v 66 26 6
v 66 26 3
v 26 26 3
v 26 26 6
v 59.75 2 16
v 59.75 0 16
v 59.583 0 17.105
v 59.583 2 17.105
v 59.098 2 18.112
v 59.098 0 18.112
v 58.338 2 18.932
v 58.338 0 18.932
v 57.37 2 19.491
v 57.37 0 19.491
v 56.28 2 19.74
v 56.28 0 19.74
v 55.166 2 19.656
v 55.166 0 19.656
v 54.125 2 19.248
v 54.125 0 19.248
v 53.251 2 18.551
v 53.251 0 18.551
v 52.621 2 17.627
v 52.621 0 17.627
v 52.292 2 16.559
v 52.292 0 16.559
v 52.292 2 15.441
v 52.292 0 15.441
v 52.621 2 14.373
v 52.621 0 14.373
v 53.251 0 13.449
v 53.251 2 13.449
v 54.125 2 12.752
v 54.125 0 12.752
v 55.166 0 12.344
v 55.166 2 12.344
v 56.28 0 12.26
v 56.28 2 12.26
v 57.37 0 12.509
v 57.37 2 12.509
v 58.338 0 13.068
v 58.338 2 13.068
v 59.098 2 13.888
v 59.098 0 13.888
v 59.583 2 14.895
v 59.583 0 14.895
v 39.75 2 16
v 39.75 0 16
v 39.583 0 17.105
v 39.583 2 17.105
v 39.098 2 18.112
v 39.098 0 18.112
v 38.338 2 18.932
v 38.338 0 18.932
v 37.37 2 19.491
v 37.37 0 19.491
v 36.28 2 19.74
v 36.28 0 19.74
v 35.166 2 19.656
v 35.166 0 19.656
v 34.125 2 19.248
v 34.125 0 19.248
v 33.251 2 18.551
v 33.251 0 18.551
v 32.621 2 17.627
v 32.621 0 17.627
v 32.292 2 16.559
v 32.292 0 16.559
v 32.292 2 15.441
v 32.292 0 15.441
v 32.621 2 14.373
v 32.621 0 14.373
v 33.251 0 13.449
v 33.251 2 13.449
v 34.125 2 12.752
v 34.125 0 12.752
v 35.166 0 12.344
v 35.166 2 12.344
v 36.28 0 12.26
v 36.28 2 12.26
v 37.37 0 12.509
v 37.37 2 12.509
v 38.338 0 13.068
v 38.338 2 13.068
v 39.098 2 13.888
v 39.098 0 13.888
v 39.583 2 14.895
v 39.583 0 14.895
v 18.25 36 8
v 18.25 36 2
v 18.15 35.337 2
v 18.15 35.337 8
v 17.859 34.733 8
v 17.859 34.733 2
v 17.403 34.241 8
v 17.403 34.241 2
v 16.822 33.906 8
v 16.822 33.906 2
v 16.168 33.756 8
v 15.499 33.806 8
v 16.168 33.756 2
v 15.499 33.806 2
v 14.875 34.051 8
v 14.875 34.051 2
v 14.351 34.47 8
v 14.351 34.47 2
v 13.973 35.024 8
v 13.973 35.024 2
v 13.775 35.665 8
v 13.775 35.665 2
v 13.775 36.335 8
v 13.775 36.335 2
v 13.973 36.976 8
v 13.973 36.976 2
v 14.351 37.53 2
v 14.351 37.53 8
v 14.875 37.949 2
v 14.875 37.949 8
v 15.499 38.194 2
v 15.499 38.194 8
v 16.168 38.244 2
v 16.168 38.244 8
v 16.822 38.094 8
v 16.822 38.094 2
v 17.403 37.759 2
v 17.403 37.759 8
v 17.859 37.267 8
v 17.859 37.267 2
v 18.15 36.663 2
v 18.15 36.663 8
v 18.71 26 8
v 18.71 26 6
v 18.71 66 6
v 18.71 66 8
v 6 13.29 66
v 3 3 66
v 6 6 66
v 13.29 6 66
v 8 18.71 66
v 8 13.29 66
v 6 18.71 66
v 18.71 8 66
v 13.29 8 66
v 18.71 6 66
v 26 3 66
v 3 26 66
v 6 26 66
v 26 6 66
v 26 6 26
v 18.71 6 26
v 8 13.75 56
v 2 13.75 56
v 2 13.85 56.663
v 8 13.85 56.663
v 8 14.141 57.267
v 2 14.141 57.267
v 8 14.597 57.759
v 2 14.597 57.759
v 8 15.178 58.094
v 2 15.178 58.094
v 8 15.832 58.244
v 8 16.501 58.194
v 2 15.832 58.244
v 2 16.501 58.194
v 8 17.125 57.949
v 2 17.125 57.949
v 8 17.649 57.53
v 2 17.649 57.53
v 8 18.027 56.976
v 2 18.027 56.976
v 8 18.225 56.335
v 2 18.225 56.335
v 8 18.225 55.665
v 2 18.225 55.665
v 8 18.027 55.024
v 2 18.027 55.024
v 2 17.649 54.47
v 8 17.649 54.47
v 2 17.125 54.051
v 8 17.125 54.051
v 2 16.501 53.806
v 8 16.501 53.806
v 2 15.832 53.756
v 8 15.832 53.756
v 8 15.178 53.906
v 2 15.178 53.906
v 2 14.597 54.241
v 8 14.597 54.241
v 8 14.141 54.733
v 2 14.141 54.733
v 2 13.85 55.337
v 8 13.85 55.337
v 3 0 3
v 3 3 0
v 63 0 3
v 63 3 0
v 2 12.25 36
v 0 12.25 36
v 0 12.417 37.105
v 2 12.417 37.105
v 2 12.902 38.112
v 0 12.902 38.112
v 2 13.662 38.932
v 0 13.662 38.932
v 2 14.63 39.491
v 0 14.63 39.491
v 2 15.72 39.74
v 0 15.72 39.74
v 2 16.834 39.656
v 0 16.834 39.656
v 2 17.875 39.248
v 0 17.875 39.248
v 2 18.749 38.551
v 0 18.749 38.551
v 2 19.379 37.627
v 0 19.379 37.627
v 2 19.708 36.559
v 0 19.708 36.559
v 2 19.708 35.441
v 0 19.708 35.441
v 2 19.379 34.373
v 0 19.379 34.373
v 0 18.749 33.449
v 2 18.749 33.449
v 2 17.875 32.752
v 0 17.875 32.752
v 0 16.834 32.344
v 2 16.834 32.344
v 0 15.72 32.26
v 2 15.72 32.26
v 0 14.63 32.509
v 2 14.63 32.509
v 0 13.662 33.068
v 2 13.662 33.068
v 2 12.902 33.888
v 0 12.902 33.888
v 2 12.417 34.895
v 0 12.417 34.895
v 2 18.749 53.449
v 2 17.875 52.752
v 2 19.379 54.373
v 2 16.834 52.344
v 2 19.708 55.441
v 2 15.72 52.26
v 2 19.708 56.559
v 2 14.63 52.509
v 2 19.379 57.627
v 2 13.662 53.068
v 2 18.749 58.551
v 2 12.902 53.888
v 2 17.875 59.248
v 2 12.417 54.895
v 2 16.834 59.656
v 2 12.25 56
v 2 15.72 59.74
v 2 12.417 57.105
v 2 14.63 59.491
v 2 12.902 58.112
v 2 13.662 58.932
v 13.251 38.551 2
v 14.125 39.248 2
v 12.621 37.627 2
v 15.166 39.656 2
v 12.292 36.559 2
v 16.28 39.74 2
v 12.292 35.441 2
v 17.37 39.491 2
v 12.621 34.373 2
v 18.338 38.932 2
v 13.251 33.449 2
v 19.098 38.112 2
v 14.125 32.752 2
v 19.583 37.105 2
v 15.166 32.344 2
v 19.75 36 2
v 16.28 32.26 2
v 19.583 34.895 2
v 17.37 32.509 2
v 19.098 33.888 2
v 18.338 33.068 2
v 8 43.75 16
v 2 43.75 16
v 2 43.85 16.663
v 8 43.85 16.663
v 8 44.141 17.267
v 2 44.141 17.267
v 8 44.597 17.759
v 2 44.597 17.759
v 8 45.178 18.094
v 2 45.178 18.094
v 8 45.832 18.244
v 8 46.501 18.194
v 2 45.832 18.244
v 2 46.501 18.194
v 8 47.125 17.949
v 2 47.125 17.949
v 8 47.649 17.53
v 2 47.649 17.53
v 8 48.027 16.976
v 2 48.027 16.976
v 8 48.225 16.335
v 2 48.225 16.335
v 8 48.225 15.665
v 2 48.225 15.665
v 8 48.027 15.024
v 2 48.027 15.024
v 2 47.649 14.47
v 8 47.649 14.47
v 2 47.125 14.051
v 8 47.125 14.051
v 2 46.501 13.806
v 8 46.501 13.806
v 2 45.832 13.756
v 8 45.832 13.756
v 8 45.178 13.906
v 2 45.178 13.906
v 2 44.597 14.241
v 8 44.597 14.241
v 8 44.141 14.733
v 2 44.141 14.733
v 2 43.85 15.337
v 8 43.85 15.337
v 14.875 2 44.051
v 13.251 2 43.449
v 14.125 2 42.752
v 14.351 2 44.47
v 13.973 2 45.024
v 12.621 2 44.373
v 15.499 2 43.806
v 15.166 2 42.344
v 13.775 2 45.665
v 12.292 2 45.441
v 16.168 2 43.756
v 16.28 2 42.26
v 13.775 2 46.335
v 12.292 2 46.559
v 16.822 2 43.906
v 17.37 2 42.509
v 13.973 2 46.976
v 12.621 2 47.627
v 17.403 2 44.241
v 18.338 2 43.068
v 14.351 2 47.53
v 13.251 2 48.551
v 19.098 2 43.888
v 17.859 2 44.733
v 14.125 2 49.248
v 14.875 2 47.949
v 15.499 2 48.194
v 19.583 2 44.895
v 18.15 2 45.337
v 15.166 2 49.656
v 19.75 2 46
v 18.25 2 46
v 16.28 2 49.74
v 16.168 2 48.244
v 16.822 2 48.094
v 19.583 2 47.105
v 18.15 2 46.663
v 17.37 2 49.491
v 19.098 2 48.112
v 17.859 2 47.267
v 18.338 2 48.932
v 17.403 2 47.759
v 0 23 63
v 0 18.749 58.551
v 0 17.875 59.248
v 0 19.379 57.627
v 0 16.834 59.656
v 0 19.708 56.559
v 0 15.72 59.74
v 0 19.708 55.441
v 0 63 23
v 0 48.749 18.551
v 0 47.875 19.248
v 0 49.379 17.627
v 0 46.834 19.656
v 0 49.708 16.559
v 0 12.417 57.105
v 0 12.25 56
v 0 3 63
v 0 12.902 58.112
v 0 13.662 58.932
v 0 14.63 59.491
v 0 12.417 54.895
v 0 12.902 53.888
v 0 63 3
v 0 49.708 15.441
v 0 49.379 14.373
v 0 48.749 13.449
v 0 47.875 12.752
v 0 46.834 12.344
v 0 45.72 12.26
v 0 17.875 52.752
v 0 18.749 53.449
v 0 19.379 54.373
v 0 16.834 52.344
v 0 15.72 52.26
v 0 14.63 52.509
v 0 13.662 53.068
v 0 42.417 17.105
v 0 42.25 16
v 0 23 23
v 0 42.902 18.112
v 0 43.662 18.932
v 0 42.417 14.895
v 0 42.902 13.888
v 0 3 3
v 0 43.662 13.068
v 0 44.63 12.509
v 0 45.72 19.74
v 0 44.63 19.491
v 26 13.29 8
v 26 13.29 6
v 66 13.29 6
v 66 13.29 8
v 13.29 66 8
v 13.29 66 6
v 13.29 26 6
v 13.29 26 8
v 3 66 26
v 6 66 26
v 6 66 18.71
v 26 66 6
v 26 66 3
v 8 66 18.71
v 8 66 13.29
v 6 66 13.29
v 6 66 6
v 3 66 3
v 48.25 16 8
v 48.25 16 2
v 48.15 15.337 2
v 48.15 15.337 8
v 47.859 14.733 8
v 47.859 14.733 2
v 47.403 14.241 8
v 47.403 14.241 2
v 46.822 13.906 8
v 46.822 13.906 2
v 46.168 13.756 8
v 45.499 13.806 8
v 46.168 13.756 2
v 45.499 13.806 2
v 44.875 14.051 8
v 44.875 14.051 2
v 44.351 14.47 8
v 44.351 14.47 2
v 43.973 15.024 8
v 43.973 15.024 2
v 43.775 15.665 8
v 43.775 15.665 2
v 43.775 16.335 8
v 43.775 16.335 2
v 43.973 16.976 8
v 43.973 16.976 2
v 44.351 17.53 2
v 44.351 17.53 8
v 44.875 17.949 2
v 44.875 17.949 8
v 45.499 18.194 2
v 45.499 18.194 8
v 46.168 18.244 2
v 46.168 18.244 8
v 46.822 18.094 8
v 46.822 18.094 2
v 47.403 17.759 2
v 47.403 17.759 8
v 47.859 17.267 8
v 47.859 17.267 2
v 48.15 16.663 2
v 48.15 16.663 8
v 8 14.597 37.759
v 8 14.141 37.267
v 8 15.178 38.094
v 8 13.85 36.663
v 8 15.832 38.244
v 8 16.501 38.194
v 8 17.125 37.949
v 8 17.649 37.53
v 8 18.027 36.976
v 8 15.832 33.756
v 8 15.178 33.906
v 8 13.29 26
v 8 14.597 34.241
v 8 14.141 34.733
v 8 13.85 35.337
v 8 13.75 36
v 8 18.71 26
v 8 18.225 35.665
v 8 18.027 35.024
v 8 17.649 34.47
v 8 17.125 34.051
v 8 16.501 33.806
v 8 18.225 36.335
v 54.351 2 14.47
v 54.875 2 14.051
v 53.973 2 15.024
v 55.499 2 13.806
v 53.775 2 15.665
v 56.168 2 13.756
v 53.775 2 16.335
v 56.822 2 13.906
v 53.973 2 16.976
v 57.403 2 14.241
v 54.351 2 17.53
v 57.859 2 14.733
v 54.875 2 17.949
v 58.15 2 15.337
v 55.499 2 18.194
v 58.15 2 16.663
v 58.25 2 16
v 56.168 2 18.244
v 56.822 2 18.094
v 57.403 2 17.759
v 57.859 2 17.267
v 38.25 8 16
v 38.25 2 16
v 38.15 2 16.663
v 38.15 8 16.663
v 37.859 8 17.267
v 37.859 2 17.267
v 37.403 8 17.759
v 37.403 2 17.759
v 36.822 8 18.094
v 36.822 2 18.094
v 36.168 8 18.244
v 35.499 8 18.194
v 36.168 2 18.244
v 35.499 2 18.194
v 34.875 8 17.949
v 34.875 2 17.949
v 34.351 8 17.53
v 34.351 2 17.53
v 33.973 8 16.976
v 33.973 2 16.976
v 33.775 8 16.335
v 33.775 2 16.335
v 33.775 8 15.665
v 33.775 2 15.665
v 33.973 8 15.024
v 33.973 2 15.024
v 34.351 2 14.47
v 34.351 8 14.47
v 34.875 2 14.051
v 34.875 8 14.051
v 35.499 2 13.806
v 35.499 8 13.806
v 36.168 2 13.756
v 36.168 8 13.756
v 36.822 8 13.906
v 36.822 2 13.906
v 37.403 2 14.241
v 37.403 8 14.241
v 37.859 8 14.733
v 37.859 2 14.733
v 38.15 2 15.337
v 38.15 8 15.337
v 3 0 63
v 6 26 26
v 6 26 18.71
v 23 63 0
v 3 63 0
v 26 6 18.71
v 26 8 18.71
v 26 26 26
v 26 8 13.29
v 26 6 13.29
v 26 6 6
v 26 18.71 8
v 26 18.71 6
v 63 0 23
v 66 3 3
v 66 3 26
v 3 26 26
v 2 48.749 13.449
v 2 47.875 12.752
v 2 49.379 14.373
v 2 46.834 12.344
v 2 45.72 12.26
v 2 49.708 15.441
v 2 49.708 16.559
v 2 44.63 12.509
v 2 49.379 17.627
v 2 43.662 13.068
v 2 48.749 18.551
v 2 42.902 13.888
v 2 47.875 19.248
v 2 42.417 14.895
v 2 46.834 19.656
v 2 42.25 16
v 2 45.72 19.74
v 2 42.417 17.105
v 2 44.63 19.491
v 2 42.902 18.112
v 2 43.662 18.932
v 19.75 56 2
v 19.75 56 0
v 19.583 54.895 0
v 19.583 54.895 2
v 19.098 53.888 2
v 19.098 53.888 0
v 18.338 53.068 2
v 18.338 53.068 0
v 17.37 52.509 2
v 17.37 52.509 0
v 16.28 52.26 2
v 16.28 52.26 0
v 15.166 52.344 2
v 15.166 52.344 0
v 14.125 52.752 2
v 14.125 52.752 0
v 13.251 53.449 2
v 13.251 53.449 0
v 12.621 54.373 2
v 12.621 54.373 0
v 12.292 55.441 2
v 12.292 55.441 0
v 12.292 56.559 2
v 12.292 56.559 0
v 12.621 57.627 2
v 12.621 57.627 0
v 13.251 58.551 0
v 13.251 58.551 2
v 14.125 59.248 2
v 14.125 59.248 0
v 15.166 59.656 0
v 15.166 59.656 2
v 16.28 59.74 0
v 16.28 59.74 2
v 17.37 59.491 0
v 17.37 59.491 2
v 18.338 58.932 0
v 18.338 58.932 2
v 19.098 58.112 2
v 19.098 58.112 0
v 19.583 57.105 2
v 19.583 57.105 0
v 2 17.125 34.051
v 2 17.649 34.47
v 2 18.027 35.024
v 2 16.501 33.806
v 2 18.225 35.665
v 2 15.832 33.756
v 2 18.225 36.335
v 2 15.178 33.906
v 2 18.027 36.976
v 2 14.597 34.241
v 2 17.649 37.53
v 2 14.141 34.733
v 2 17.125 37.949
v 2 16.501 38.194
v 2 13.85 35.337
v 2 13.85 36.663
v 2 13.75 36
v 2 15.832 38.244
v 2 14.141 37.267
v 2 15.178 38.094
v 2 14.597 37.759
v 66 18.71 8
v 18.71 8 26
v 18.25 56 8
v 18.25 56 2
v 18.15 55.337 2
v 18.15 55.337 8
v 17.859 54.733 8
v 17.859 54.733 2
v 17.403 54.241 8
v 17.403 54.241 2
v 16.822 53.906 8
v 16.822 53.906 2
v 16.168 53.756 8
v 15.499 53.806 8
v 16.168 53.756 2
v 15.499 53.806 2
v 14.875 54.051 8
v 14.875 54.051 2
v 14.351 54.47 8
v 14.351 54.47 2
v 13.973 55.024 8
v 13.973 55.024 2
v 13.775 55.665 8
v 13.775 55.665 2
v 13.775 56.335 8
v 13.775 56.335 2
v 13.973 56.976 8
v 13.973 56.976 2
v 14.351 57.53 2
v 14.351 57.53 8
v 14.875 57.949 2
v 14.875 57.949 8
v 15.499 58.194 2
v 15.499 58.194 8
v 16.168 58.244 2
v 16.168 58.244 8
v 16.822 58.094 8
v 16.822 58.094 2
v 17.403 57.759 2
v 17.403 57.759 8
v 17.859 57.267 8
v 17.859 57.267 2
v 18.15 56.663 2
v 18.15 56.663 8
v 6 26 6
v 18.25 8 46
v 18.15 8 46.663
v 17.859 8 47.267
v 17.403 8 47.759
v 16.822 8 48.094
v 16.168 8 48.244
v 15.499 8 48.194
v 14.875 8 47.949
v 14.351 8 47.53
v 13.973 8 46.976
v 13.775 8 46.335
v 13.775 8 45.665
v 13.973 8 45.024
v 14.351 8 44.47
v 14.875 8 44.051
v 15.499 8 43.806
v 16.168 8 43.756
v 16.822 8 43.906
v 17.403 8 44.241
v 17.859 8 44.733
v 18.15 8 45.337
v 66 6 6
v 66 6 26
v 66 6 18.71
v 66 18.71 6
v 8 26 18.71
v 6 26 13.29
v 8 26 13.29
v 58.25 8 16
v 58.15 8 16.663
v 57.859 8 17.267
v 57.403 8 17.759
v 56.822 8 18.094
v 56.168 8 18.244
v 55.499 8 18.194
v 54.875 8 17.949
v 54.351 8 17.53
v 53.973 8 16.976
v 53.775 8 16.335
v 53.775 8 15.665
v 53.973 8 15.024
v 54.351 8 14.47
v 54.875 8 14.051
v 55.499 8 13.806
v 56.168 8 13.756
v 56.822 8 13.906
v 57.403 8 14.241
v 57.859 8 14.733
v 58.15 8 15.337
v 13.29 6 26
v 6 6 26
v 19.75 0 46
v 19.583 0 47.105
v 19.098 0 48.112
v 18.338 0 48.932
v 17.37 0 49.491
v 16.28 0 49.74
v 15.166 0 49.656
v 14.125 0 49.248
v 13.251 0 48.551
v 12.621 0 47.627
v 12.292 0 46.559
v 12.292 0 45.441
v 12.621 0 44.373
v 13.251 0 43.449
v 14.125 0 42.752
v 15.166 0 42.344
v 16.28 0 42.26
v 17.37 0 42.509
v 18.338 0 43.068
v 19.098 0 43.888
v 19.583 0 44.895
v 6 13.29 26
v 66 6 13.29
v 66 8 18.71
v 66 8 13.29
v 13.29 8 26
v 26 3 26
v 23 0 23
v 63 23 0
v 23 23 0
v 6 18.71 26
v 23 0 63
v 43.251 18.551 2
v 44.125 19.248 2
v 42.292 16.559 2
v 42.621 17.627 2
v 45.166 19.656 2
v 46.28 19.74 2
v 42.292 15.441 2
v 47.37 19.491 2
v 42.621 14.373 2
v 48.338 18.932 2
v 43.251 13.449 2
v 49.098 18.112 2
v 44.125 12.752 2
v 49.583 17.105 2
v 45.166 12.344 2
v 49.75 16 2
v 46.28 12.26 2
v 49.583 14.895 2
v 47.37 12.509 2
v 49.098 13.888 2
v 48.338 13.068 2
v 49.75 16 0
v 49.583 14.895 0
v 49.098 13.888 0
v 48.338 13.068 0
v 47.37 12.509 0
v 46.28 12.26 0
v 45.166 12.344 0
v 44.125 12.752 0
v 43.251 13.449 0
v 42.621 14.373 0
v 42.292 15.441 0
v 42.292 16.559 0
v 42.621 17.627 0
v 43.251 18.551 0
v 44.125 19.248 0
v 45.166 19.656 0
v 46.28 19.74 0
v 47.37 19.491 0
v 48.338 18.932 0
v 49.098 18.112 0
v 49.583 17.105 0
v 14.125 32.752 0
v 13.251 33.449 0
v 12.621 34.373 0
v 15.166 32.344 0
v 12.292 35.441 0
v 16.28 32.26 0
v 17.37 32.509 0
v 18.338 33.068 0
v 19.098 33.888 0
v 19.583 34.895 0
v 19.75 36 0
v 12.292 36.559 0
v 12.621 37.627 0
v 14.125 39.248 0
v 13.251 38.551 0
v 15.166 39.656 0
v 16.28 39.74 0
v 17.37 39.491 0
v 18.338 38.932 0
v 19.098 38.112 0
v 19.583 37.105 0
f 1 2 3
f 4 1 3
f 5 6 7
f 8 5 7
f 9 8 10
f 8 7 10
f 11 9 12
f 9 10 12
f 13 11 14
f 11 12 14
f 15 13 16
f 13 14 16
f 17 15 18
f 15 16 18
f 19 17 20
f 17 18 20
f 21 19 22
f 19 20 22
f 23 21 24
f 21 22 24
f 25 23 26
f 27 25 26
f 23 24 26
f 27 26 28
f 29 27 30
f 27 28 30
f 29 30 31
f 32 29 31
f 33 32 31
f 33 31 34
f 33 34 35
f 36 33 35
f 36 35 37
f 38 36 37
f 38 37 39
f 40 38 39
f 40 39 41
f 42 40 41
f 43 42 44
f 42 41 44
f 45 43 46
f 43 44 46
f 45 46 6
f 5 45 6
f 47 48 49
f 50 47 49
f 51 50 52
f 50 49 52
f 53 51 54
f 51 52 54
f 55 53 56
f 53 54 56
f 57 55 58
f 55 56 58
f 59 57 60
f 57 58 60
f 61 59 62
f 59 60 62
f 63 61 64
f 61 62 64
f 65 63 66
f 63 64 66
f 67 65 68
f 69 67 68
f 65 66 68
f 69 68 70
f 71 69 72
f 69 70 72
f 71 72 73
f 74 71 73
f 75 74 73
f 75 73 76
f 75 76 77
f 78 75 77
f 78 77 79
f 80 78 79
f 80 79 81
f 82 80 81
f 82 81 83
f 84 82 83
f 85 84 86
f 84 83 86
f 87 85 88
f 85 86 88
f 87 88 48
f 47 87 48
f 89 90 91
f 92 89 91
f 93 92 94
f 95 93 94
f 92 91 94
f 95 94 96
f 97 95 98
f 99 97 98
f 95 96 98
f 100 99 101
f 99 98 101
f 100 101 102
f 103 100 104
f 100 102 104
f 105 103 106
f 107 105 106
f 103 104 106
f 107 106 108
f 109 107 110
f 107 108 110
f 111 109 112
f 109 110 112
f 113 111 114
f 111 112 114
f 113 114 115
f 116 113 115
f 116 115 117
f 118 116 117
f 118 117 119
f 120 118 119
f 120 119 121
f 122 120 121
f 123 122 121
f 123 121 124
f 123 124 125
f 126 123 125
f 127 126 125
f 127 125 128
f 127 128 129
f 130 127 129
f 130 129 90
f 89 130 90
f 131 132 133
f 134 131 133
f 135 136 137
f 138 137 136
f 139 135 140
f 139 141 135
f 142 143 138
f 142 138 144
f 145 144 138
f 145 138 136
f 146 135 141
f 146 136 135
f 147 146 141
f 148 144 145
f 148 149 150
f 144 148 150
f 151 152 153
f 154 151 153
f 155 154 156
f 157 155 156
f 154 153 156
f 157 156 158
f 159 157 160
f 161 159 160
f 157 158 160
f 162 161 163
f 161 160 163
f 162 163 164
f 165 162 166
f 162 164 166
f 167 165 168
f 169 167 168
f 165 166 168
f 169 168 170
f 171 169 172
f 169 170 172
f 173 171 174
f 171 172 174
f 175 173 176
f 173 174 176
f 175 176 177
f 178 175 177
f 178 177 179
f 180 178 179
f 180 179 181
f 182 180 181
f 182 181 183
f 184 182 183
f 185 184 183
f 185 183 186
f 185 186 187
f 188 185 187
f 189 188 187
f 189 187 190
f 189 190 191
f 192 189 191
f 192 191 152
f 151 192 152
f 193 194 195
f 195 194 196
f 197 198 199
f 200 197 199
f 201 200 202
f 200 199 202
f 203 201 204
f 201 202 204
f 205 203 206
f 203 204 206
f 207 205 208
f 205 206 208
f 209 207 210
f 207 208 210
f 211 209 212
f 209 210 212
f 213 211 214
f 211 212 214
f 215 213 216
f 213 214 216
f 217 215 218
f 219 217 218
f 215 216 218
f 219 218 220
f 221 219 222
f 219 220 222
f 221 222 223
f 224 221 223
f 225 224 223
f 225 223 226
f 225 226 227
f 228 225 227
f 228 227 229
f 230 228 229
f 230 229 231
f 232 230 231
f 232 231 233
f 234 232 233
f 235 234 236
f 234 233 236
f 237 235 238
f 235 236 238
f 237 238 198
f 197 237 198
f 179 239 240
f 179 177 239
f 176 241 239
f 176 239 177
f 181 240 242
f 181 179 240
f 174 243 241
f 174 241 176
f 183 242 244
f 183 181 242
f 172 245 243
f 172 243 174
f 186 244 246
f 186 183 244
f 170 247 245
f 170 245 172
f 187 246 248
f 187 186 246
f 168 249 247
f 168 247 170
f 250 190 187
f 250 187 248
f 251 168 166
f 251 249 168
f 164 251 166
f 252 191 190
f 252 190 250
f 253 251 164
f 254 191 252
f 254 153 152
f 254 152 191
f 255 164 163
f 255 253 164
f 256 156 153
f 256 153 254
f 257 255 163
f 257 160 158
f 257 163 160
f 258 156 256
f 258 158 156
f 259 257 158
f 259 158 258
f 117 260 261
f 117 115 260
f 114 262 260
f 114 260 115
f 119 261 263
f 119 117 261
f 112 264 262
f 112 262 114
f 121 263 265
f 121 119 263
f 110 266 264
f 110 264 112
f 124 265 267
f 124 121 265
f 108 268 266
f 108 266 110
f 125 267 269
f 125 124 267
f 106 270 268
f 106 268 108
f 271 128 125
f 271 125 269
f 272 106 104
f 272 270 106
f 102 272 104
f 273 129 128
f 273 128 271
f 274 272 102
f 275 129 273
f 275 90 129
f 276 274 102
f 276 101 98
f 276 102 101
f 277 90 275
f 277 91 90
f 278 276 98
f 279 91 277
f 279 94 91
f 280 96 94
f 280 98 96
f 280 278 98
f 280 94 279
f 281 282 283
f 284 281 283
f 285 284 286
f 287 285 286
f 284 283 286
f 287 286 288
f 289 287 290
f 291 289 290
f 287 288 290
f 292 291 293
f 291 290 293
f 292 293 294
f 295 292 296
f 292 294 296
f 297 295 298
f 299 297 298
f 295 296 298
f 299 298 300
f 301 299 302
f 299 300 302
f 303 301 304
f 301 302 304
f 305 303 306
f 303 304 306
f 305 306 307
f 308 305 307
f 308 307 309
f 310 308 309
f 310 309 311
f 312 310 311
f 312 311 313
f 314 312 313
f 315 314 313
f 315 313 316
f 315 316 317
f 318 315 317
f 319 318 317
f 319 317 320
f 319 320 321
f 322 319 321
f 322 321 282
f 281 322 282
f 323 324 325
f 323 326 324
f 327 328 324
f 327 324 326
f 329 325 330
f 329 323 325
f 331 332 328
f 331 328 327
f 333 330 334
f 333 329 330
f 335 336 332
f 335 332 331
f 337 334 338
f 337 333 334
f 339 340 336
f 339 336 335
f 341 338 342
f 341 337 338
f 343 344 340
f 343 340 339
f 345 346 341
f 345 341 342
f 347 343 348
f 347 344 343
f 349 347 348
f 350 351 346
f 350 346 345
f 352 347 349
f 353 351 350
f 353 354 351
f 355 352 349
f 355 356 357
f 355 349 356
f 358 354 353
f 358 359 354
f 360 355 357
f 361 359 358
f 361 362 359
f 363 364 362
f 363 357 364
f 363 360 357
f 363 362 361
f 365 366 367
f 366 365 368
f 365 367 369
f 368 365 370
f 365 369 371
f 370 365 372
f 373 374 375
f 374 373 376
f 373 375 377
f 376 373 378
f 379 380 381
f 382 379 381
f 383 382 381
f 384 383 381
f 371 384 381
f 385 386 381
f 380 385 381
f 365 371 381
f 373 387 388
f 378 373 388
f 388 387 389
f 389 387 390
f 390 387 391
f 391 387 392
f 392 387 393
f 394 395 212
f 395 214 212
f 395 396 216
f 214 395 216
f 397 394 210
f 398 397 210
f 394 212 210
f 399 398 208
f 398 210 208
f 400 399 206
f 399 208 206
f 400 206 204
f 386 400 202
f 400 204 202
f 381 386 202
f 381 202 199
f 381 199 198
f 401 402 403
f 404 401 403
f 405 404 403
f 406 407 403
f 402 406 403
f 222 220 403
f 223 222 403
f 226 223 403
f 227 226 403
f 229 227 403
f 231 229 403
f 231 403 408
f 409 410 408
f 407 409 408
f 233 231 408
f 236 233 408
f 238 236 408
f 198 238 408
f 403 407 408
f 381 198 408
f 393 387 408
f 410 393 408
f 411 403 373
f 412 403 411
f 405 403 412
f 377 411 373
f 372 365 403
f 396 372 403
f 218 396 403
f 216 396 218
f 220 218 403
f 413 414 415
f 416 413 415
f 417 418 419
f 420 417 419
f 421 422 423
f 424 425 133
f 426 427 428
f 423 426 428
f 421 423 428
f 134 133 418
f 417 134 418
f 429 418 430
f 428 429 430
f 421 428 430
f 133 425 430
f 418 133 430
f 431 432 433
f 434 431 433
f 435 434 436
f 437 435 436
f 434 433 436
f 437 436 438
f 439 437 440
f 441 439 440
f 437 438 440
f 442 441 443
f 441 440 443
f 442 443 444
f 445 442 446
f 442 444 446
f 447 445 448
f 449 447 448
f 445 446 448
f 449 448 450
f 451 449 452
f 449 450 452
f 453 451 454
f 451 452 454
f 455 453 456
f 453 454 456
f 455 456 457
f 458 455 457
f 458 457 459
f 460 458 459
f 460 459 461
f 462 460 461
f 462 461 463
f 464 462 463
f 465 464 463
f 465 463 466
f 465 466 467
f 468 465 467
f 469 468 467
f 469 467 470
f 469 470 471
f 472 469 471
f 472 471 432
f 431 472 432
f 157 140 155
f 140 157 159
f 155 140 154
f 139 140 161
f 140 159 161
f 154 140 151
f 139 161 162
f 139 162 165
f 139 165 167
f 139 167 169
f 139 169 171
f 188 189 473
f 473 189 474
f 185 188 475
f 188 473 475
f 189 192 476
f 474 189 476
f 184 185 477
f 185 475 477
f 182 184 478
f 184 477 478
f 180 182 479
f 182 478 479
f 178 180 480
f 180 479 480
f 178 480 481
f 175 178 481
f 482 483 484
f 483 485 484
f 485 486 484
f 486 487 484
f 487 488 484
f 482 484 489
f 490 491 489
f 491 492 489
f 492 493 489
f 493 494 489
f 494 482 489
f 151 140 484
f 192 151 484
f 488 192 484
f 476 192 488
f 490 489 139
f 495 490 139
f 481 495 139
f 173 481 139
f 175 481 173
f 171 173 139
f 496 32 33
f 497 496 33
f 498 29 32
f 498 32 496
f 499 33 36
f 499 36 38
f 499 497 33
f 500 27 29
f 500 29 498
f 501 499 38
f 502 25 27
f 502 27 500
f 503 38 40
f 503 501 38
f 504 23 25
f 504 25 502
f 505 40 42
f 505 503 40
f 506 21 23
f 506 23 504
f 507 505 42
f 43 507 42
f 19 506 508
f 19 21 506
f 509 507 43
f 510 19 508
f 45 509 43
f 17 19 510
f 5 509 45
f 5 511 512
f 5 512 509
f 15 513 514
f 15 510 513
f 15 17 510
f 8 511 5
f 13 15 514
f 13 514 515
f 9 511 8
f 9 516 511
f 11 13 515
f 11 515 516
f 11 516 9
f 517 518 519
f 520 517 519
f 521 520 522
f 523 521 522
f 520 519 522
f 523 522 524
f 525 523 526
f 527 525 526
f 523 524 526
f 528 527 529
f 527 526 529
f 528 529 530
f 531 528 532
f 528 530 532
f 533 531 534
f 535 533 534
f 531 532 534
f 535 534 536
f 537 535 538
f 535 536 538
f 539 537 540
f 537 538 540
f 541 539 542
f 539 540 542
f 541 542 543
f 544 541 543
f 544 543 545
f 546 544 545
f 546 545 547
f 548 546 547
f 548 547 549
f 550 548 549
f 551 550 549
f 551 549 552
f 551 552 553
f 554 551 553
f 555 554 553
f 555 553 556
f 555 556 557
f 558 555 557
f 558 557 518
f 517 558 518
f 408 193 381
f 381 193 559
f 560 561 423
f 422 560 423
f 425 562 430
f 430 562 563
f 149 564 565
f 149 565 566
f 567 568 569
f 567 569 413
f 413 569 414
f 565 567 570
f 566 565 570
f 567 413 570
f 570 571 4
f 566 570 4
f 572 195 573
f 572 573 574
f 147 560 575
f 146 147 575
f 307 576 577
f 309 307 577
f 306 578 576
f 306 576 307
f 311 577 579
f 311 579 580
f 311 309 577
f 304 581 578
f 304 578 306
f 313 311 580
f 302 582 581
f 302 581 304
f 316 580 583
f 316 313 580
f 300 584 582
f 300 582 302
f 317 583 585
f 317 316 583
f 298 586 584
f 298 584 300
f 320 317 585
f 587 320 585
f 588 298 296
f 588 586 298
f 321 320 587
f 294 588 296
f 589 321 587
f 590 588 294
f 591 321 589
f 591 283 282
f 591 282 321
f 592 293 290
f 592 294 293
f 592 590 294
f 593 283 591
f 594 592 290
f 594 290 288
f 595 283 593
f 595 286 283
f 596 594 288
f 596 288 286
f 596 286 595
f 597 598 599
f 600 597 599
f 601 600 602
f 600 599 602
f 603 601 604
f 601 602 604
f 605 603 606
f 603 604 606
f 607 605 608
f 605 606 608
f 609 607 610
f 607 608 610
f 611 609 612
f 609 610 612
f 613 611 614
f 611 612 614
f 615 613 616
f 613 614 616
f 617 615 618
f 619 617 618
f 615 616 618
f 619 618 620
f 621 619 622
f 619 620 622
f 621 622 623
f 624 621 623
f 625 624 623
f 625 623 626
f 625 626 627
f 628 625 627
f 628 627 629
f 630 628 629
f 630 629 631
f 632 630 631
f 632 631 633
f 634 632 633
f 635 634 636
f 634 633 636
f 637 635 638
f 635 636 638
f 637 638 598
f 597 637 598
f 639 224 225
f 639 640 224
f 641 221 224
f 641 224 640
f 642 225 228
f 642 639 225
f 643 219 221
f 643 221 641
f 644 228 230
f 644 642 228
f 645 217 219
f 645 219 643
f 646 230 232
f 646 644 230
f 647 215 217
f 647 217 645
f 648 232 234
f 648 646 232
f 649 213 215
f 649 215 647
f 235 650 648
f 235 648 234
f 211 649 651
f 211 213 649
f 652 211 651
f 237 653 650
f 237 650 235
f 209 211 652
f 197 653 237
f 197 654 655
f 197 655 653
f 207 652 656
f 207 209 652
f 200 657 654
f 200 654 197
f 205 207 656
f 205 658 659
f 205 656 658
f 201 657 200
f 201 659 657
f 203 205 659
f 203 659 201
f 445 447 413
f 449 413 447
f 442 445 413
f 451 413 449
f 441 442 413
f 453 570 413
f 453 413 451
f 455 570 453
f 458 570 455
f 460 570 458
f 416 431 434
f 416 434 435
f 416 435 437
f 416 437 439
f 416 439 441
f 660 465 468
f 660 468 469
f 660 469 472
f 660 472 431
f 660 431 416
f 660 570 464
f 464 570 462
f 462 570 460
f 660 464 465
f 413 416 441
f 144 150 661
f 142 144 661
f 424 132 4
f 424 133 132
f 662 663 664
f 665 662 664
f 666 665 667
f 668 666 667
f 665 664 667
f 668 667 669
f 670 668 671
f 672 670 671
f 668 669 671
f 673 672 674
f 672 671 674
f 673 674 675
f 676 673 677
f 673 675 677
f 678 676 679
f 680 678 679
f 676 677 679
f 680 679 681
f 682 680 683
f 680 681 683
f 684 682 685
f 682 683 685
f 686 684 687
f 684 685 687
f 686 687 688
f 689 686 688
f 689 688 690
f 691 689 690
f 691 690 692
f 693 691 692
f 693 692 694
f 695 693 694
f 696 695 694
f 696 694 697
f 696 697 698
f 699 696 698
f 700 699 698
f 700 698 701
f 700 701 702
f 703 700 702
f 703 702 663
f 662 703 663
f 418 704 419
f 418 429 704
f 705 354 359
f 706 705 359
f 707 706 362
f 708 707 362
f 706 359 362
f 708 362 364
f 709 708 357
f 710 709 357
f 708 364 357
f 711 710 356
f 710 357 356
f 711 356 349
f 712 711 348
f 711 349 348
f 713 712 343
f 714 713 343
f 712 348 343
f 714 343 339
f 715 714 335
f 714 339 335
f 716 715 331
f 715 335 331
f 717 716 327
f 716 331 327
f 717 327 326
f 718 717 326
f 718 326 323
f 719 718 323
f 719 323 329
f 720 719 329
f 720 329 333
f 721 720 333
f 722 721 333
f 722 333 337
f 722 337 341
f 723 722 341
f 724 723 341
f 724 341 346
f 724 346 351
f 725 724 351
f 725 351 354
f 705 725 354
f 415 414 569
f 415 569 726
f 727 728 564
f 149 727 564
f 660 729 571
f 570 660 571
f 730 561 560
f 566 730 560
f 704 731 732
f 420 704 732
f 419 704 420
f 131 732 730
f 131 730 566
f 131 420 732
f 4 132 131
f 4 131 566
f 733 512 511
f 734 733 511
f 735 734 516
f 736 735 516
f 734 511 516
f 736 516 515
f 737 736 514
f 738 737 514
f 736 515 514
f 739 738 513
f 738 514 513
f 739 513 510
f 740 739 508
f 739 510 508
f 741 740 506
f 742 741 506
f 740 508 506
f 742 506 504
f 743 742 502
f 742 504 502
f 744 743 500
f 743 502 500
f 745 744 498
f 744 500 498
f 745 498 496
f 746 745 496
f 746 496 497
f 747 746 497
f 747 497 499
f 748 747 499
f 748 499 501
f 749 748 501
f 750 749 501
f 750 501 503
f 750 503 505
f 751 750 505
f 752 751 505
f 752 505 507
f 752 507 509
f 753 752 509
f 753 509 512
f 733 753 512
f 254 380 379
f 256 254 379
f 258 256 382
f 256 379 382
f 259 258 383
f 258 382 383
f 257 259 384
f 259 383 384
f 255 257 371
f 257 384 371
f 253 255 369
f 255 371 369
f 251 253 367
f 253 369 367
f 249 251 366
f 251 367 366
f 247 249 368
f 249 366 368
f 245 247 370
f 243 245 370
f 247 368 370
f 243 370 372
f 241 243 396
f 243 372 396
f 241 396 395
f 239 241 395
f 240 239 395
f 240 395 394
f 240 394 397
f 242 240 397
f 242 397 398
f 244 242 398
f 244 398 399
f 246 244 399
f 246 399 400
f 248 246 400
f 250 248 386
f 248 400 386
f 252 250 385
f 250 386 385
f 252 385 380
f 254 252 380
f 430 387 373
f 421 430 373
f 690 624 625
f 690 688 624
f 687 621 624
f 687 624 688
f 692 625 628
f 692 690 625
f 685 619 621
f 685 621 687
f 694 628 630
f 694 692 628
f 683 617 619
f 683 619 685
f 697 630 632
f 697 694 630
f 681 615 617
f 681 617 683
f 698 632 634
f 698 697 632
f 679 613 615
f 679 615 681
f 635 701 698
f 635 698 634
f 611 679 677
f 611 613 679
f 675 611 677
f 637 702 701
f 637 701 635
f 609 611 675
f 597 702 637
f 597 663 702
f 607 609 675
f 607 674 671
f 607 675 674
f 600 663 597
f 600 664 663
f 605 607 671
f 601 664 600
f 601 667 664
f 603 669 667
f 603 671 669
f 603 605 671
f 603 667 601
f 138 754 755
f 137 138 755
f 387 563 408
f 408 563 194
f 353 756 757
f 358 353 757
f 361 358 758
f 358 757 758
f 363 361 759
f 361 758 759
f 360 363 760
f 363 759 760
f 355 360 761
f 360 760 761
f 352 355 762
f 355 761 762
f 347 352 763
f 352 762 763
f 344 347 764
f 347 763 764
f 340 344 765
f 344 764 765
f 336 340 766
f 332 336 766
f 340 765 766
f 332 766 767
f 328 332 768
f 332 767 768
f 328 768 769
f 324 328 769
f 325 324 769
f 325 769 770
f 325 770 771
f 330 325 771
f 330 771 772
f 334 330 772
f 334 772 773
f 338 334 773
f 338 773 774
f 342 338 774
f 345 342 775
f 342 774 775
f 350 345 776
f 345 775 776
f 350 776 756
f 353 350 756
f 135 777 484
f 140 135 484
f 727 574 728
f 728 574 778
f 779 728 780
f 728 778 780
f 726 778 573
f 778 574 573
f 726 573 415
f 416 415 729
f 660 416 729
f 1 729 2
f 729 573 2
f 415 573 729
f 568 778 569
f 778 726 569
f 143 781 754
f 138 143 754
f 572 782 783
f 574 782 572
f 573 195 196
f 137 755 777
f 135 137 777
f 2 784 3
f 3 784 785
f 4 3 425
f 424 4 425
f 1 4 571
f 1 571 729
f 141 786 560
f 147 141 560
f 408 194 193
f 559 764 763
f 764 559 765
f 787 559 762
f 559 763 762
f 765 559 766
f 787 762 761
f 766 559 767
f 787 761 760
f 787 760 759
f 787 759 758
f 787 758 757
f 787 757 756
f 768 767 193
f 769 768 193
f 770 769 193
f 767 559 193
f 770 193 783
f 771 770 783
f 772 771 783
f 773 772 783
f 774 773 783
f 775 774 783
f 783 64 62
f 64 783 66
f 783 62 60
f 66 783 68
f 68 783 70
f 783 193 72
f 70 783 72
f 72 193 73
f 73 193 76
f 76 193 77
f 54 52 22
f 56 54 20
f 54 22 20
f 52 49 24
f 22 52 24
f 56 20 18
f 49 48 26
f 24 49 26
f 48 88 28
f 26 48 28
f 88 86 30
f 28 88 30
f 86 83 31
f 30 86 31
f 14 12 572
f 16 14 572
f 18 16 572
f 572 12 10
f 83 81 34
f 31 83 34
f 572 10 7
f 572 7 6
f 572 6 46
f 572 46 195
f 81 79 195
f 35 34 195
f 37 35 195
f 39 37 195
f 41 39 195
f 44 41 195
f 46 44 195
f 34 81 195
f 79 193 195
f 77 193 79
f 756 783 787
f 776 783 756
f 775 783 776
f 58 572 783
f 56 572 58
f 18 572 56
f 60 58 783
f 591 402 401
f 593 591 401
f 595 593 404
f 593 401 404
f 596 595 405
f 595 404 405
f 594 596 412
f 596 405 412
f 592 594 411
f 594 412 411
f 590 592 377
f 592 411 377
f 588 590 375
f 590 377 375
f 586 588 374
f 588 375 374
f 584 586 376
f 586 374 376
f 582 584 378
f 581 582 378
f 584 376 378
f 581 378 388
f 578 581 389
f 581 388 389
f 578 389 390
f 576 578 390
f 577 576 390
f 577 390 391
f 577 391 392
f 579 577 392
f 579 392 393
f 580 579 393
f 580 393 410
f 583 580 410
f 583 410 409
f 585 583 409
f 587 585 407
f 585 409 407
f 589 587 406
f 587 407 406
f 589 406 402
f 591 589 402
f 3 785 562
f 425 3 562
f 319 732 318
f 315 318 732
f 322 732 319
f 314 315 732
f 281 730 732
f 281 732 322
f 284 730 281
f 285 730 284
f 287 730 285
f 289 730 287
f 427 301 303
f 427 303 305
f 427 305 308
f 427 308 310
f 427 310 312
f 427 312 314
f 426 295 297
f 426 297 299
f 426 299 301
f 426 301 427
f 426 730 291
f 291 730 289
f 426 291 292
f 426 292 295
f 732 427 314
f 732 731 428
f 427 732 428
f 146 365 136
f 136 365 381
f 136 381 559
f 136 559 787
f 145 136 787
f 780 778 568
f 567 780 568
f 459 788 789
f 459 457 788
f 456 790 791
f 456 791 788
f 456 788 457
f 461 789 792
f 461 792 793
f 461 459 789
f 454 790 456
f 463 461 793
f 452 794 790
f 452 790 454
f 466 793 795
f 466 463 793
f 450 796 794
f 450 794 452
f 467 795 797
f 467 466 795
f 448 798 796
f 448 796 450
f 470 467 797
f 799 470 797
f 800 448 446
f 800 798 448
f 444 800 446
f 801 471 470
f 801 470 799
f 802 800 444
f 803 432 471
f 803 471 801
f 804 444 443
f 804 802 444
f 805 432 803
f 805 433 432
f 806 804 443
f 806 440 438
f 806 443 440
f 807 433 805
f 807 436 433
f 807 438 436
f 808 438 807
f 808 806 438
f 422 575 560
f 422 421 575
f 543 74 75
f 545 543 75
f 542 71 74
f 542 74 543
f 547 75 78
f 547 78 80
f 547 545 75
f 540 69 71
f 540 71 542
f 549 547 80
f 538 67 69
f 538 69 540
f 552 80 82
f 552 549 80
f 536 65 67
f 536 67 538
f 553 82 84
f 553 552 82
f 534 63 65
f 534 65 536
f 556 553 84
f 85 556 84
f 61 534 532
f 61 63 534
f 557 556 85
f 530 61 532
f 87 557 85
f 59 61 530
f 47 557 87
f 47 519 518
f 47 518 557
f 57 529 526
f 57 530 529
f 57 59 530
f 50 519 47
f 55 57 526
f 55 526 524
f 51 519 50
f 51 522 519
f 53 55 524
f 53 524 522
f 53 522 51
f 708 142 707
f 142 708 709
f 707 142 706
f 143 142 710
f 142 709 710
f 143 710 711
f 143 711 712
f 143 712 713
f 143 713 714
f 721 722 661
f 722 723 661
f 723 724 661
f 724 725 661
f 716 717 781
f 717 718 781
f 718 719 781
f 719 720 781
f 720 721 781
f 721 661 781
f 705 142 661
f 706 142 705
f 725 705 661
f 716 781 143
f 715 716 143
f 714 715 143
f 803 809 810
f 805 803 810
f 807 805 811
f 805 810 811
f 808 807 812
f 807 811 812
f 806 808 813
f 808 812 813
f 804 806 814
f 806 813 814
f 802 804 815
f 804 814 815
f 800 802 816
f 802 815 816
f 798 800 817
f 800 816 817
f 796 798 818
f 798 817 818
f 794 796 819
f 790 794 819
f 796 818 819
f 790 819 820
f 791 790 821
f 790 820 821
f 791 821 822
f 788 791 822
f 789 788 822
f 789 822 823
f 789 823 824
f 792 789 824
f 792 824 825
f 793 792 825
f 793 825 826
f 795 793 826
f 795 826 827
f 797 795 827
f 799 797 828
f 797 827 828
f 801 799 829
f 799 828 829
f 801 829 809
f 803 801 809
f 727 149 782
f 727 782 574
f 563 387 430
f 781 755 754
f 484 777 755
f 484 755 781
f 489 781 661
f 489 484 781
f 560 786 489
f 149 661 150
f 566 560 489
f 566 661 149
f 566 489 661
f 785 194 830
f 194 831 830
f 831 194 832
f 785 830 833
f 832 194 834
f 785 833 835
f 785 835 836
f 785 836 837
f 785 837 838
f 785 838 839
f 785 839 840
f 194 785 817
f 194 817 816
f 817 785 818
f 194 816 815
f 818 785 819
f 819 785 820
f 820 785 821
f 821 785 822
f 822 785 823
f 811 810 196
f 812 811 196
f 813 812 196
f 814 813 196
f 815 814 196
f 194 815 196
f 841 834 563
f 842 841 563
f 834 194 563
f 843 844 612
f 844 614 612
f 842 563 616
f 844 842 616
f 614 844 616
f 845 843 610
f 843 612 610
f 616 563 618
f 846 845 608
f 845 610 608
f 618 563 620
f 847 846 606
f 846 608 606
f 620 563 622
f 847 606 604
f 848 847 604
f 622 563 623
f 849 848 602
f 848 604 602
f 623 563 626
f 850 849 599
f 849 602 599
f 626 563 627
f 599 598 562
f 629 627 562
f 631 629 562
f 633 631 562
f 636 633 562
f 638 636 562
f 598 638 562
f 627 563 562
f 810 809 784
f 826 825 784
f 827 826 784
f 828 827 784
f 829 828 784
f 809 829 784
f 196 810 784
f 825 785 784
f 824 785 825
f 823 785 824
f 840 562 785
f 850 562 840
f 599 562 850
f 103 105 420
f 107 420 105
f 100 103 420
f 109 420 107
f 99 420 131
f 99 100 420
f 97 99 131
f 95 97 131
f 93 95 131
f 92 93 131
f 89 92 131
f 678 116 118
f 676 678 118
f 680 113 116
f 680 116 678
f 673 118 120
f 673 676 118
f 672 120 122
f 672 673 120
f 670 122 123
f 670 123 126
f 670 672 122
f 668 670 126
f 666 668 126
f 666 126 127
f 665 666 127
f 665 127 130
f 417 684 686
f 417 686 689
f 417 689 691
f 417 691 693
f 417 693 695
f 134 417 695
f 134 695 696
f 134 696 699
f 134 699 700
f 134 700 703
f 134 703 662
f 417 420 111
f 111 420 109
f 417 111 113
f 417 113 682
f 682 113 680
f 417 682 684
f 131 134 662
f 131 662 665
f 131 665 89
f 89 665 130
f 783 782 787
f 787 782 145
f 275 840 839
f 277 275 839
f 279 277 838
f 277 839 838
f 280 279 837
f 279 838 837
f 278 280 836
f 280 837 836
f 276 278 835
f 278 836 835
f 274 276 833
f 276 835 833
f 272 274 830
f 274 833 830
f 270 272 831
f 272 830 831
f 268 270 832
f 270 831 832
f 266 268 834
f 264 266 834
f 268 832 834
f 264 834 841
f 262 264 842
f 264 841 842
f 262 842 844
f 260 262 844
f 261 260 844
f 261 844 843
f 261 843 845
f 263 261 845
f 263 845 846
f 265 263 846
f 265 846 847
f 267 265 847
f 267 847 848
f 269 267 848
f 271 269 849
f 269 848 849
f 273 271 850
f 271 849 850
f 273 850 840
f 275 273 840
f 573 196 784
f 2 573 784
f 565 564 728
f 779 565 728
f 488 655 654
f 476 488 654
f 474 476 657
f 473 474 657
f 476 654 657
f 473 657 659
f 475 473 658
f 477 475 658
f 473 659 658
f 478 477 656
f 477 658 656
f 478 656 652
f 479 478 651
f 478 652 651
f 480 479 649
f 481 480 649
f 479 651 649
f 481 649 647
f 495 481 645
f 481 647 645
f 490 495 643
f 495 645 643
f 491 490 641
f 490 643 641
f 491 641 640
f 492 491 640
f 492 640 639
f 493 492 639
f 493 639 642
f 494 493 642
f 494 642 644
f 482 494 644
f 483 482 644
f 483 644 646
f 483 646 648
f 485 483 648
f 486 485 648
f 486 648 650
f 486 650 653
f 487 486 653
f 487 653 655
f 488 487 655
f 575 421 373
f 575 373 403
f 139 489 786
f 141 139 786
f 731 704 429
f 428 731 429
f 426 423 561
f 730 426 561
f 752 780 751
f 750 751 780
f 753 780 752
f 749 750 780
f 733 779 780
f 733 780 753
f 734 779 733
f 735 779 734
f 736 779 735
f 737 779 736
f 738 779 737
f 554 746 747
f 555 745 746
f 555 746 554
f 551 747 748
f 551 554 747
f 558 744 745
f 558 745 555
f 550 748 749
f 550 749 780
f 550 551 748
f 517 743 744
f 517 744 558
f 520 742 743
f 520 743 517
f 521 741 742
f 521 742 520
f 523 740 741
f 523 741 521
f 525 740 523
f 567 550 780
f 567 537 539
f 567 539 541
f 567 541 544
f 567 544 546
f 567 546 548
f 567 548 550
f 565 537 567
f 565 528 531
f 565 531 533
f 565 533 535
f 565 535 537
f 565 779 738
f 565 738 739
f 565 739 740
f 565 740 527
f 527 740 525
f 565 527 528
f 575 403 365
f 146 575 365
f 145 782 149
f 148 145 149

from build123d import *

# Parameters (mm, degrees)
F1_DEPTH  = 6
F3_DEPTH  = 20
F5_DEPTH  = 40
F7_DEPTH  = 60
F9_DEPTH  = 2
F11_DEPTH = 2
F13_DEPTH = 2
F14_R     = 2.25
F15_DEPTH = 8
F16_R     = 2.25
F17_DEPTH = 8
F18_R     = 2.25
F19_DEPTH = 8
F20_R     = 3.75
F21_DEPTH = 2
F22_R     = 3.75
F23_DEPTH = 2
F24_R     = 3.75
F25_DEPTH = 2
F26_SIZE  = 3
F27_W     = 20
F27_H     = 20
F28_DEPTH = 20


with BuildPart() as f1:
    # F0 (on Top) → F1 (new body)
    with BuildSketch(Plane.XY):
        Polygon((0, 66), (0, 0), (66, 0), (66, 26), (26, 26), (26, 66), align=None)
    extrude(amount=F1_DEPTH)

    # F2 (on face) → F3 (join)
    with BuildSketch(Plane.XY.offset(6)):
        Polygon((6, 66), (0, 66), (0, 0), (66, 0), (66, 6), (6, 6), align=None)
    extrude(amount=F3_DEPTH)

    # F4 (on face) → F5 (join)
    with BuildSketch(Plane.XY.offset(26)):
        Polygon((6, 6), (6, 26), (0, 26), (0, 0), (26, 0), (26, 6), align=None)
    extrude(amount=F5_DEPTH)

    # F6 (on face) → F7 (join)
    with BuildSketch(Plane.XY.offset(6)):
        Polygon((13.29, 6), (16, 6), (18.71, 6), (18.71, 8), (13.29, 8), align=None)
        Polygon((6, 18.71), (6, 16), (6, 13.29), (8, 13.29), (8, 18.71), align=None)
    extrude(amount=F7_DEPTH)

    # F8 (on face) → F9 (join)
    with BuildSketch(Plane.XY.offset(6)):
        Polygon((66, 13.29), (66, 16), (66, 18.71), (26, 18.71), (26, 13.29), align=None)
        Polygon((18.71, 66), (16, 66), (13.29, 66), (13.29, 26), (18.71, 26), align=None)
    extrude(amount=F9_DEPTH)

    # F10 (on face) → F11 (join)
    with BuildSketch(Plane(origin=(0, 6, 0), x_dir=(-1, 0, 0), z_dir=(0, 1, 0))):
        Polygon((-66, 18.71), (-66, 16), (-66, 13.29), (-26, 13.29), (-26, 16), (-26, 18.71), align=None)
    extrude(amount=F11_DEPTH)

    # F12 (on face) → F13 (join)
    with BuildSketch(Plane.YZ.offset(6)):
        Polygon((66, 13.29), (66, 16), (66, 18.71), (26, 18.71), (26, 13.29), align=None)
    extrude(amount=F13_DEPTH)

    # F14 (on face) → F15 (cut, through all)
    with BuildSketch(Plane.XZ):
        with Locations((56, 16)):
            Circle(F14_R)
        with Locations((16, 46)):
            Circle(F14_R)
        with Locations((36, 16)):
            Circle(F14_R)
    extrude(amount=-F15_DEPTH, mode=Mode.SUBTRACT)

    # F16 (on face) → F17 (cut, through all)
    with BuildSketch(Plane(origin=(0, 0, 0), x_dir=(0, -1, 0), z_dir=(-1, 0, 0))):
        with Locations((-16, 56)):
            Circle(F16_R)
        with Locations((-46, 16)):
            Circle(F16_R)
        with Locations((-16, 36)):
            Circle(F16_R)
    extrude(amount=-F17_DEPTH, mode=Mode.SUBTRACT)

    # F18 (on face) → F19 (cut, through all)
    with BuildSketch(Plane(origin=(0, 0, 0), x_dir=(1, 0, 0), z_dir=(0, 0, -1))):
        with Locations((46, -16)):
            Circle(F18_R)
        with Locations((16, -56)):
            Circle(F18_R)
        with Locations((16, -36)):
            Circle(F18_R)
    extrude(amount=-F19_DEPTH, mode=Mode.SUBTRACT)

    # F20 (on face) → F21 (cut)
    with BuildSketch(Plane.XZ):
        with Locations((16, 46)):
            Circle(F20_R)
        with Locations((36, 16)):
            Circle(F20_R)
        with Locations((56, 16)):
            Circle(F20_R)
    extrude(amount=-F21_DEPTH, mode=Mode.SUBTRACT)

    # F22 (on face) → F23 (cut)
    with BuildSketch(Plane(origin=(0, 0, 0), x_dir=(0, -1, 0), z_dir=(-1, 0, 0))):
        with Locations((-16, 56)):
            Circle(F22_R)
        with Locations((-46, 16)):
            Circle(F22_R)
        with Locations((-16, 36)):
            Circle(F22_R)
    extrude(amount=-F23_DEPTH, mode=Mode.SUBTRACT)

    # F24 (on face) → F25 (cut)
    with BuildSketch(Plane(origin=(0, 0, 0), x_dir=(1, 0, 0), z_dir=(0, 0, -1))):
        with Locations((16, -56)):
            Circle(F24_R)
        with Locations((46, -16)):
            Circle(F24_R)
        with Locations((16, -36)):
            Circle(F24_R)
    extrude(amount=-F25_DEPTH, mode=Mode.SUBTRACT)

    # F26
    f26_edges = [f1.edges().sort_by_distance(p)[0] for p in [
        (33, 0, 0),
        (0, 33, 0),
        (0, 0, 33),
        (0, 26, 46),
        (0, 46, 26),
        (26, 0, 46),
        (46, 0, 26),
        (0, 13, 66),
        (13, 0, 66),
        (0, 66, 13),
        (13, 66, 0),
        (66, 0, 13),
        (66, 13, 0),
        (46, 26, 0),
        (26, 46, 0),
    ]]
    chamfer(f26_edges, length=F26_SIZE)

    # F27 (on face) → F28 (join)
    with BuildSketch(Plane.XY.offset(6)):
        with Locations((16, 16)):
            Rectangle(F27_W, F27_H)
    extrude(amount=F28_DEPTH)


solid = f1.part
